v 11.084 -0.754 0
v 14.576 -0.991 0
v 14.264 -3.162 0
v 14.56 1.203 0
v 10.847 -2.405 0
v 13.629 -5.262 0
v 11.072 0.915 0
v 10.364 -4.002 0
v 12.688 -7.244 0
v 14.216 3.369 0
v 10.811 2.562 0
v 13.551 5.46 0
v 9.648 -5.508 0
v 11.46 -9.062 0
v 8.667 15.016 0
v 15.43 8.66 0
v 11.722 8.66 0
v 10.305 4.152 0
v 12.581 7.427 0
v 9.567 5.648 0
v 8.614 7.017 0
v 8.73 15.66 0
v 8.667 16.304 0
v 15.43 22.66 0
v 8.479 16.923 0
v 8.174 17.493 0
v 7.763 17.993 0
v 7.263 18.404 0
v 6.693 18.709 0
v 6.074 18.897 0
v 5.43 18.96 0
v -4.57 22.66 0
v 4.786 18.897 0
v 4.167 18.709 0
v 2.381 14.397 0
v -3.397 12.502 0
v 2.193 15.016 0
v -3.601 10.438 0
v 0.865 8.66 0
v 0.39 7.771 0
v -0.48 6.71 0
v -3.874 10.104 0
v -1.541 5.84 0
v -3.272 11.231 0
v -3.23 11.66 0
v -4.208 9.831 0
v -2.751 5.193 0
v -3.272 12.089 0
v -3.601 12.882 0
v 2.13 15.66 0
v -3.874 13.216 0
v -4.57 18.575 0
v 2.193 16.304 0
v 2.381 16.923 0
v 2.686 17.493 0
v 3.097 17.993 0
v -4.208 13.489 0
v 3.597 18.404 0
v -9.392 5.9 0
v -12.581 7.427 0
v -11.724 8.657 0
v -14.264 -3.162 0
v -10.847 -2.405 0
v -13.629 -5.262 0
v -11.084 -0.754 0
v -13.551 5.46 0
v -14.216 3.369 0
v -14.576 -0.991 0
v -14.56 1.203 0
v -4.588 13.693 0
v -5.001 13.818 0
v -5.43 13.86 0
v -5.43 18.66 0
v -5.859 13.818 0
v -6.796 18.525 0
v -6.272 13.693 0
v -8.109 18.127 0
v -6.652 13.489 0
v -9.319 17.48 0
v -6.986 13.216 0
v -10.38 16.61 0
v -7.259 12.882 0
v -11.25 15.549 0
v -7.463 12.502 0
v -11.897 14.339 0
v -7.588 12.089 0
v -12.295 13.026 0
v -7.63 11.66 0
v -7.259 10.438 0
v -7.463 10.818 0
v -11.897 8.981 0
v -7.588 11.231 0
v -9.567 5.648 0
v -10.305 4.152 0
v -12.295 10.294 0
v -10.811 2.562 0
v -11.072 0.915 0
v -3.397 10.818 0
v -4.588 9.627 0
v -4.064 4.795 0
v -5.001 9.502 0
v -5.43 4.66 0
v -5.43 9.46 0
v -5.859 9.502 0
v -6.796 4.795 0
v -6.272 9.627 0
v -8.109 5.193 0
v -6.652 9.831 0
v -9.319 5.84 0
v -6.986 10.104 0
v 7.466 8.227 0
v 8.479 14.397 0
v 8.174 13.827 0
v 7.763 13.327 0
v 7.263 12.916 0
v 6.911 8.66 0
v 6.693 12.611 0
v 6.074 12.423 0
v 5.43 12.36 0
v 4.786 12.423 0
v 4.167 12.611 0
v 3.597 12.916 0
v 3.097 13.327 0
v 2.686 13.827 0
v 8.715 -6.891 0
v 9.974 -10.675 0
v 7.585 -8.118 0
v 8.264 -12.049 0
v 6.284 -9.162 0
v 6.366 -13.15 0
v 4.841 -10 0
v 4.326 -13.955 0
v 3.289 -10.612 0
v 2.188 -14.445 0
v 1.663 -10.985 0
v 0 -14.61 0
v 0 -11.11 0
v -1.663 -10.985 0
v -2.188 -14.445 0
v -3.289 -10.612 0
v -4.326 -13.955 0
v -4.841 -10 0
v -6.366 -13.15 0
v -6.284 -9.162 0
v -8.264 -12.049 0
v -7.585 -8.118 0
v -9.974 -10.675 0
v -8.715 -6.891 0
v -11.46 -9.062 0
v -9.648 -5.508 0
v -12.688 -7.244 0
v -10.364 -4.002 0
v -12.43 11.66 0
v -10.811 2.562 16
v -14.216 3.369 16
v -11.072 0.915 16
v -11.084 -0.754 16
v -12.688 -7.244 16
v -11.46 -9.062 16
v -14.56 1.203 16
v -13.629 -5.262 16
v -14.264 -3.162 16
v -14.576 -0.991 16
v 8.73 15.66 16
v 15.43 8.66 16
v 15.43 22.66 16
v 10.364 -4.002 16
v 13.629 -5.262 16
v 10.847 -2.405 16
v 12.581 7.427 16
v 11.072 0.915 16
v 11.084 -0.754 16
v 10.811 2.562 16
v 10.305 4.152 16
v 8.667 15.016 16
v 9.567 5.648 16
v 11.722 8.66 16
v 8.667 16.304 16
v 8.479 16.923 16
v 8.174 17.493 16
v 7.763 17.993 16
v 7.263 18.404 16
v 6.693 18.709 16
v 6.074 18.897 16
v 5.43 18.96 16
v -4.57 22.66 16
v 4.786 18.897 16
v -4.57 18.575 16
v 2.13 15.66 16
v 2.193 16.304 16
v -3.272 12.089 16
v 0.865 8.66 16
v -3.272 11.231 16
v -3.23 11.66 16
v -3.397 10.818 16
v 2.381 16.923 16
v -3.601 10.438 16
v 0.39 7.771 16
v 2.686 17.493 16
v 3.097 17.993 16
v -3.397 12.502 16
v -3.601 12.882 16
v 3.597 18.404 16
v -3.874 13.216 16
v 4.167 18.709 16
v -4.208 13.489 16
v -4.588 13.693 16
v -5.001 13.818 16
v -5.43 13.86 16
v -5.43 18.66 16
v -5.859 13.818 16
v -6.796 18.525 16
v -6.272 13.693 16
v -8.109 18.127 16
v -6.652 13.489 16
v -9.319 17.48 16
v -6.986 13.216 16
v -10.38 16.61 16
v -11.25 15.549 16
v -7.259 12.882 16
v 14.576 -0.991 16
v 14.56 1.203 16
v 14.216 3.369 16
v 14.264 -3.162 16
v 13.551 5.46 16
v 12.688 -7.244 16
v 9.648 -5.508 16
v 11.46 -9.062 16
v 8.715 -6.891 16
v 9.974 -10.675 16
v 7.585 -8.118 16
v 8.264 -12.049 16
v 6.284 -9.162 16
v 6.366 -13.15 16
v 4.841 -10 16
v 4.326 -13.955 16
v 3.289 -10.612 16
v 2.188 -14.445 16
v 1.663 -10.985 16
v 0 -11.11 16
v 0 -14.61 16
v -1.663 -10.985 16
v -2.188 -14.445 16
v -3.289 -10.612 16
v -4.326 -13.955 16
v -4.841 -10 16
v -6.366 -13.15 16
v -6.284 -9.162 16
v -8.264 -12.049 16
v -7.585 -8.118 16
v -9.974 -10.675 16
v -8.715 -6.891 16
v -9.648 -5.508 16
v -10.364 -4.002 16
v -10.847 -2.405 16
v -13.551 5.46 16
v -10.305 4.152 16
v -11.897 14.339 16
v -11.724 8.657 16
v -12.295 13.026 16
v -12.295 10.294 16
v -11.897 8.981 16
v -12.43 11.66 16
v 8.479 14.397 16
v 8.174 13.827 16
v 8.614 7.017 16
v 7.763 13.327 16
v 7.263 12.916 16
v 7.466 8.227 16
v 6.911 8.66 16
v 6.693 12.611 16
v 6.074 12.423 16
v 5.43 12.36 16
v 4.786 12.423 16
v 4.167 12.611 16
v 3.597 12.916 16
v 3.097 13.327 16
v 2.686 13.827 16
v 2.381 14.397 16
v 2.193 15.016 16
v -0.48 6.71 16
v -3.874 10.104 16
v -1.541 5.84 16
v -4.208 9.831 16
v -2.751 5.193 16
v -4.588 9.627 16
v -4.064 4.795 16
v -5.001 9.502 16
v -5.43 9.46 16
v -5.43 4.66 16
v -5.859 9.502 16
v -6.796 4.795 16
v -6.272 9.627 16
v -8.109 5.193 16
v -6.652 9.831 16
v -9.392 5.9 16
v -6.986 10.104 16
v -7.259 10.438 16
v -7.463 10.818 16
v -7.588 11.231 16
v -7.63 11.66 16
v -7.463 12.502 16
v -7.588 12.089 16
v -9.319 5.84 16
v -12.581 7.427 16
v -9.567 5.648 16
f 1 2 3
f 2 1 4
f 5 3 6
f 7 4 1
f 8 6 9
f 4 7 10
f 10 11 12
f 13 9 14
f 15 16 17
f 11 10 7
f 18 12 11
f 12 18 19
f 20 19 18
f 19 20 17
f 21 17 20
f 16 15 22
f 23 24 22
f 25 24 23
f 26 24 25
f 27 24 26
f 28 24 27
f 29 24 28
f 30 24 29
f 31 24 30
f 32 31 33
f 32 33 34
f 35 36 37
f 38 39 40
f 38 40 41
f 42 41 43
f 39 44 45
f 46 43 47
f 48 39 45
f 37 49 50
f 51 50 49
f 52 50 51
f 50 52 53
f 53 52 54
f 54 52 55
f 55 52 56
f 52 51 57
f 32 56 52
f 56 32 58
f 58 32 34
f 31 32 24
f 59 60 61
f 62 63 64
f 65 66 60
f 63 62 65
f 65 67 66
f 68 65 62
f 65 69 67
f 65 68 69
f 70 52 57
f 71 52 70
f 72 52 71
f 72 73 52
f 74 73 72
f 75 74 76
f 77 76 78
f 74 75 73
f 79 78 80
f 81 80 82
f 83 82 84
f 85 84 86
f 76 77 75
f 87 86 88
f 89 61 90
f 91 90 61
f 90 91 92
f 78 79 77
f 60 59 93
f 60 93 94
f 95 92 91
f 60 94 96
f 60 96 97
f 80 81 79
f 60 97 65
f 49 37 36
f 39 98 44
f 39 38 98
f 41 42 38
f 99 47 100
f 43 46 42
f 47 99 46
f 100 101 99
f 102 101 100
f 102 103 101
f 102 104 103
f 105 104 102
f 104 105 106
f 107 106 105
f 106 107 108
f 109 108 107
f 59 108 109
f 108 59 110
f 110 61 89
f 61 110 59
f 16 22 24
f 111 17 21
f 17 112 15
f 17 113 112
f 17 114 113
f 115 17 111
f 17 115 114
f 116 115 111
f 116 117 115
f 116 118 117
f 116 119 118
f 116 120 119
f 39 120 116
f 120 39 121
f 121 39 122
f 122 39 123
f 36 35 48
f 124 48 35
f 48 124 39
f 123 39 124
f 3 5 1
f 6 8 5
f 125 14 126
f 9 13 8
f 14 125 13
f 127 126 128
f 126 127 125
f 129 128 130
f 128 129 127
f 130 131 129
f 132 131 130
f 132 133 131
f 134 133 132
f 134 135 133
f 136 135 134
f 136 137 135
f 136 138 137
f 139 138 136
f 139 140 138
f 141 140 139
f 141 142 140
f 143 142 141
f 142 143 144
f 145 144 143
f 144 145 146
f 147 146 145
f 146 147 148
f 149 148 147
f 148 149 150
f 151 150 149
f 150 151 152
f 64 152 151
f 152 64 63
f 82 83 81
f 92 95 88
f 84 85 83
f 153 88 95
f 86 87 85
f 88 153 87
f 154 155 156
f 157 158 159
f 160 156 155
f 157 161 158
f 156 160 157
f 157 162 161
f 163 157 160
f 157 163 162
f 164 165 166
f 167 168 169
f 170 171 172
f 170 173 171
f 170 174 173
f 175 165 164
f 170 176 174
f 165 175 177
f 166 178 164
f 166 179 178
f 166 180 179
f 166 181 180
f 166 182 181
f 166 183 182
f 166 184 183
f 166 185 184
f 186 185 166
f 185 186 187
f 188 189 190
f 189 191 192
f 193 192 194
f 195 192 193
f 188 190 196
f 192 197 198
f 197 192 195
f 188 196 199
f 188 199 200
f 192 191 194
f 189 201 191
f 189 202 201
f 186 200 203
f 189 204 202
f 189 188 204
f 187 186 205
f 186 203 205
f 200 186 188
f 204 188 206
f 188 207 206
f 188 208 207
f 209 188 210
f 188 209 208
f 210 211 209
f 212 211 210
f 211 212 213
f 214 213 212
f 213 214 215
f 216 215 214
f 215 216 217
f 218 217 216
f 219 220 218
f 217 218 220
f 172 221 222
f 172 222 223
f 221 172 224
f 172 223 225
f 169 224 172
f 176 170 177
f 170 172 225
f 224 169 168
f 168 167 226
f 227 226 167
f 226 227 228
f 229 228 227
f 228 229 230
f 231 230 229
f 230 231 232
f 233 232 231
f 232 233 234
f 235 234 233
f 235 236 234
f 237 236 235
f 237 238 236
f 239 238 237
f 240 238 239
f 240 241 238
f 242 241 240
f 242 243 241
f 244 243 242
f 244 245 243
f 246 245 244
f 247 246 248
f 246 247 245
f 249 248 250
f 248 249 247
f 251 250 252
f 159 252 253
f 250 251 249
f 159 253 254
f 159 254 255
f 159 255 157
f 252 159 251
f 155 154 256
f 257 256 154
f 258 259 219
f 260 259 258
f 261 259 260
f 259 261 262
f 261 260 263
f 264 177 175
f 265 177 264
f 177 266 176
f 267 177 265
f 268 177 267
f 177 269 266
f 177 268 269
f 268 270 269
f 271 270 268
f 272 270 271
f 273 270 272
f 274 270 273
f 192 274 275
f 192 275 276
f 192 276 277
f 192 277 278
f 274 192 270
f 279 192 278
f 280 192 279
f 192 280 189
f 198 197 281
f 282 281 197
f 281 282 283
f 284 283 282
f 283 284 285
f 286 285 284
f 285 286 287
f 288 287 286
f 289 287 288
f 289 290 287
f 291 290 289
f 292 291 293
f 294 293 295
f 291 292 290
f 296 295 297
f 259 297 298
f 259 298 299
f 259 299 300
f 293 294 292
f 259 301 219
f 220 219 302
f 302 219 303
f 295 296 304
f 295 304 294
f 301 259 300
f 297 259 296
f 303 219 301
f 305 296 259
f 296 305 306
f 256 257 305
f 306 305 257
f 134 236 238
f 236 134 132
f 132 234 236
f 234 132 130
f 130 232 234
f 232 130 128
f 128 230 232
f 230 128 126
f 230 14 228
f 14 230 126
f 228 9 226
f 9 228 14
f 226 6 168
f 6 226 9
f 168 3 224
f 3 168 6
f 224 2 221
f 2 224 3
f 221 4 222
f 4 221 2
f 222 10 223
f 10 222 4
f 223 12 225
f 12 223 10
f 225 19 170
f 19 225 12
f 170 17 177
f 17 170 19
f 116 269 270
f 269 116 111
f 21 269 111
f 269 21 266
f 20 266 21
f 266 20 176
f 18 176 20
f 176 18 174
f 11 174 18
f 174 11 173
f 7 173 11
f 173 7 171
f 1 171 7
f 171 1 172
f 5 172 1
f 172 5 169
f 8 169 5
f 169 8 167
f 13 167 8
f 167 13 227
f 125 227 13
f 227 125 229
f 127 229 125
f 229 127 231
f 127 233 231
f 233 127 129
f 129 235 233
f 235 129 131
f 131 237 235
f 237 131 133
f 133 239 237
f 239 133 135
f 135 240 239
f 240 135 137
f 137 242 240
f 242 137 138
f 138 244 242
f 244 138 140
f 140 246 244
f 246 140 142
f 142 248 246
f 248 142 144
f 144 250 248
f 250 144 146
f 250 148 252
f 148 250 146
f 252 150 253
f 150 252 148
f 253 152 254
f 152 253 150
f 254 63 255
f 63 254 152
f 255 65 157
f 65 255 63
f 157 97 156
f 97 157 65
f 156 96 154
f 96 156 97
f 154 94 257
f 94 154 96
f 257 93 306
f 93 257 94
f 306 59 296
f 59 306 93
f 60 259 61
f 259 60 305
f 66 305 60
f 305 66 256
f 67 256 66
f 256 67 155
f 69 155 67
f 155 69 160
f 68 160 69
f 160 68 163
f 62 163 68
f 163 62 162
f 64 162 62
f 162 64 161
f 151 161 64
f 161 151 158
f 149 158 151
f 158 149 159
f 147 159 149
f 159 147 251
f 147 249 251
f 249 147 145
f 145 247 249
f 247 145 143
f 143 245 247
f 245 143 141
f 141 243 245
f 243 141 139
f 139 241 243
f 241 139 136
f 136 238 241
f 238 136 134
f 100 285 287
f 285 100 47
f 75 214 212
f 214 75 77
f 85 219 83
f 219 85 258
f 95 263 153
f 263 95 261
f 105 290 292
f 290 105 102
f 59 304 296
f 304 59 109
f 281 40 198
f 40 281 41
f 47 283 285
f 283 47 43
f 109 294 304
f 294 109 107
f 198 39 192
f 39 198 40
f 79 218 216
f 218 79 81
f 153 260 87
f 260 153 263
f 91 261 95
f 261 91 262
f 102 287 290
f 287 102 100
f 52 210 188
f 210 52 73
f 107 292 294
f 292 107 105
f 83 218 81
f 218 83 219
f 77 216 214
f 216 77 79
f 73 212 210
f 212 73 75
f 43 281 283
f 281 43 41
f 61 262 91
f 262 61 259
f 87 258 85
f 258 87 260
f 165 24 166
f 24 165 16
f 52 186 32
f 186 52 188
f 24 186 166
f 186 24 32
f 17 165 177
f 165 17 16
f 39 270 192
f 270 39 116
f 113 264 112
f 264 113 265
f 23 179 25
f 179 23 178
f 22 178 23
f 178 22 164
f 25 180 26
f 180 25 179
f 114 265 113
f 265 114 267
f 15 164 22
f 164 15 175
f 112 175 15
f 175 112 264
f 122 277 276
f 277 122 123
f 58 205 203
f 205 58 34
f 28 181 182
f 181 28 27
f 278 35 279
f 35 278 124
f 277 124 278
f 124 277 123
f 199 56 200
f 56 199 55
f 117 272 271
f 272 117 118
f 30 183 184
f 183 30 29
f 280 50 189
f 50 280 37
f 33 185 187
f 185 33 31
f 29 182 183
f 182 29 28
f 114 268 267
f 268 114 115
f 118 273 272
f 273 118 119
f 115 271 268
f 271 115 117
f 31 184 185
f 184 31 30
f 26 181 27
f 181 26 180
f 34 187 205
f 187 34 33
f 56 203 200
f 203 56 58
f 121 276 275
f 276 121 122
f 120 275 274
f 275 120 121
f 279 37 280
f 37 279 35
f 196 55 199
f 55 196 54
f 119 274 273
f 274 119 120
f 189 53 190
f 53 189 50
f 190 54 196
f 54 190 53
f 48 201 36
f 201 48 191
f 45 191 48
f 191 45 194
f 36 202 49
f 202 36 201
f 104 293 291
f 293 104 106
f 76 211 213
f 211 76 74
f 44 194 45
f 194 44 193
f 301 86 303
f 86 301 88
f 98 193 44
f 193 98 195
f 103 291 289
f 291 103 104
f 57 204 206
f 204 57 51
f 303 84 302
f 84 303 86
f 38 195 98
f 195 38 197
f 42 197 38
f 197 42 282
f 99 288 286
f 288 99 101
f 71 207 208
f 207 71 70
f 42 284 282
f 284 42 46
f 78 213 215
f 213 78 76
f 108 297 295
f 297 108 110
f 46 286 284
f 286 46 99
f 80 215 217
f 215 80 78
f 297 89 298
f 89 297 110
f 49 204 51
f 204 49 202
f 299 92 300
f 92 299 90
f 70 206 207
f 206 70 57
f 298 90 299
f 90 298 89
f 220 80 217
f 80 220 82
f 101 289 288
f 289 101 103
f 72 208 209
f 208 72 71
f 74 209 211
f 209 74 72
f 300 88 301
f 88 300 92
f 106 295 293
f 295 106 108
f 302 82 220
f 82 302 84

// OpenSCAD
$fn = 32;

// ----------------------------------------------------------------------
// Pipe clamp: 29.22 mm ring, 3.5 mm wall, 16 mm wide
// ----------------------------------------------------------------------

// --- parameters (mm) ---
outer_r = 14.61;          // clamp outside radius
inner_r = 11.11;          // pipe bore radius
band = 3.5;               // band thickness
clamp_w = 16;             // clamp width
opening = 50;             // opening angle between the ends
lug_w = 20;               // lug width
lug_len = 14;             // lug length
bolt_d = 6.6;             // bolt hole
knuckle_d = 14;           // hinge knuckle diameter
pin_d = 4.4;              // hinge pin hole

clamp_profile = [[-6.174, 13.241], [-8.087, 12.167], [-9.818, 10.819], [-11.327, 9.227], [-12.581, 7.427], [-13.551, 5.46], [-14.216, 3.369], [-14.56, 1.203], [-14.576, -0.991], [-14.264, -3.162], [-13.629, -5.262], [-12.688, -7.244], [-11.46, -9.062], [-9.974, -10.675], [-8.264, -12.049], [-6.366, -13.15], [-4.326, -13.955], [-2.188, -14.445], [0, -14.61], [2.188, -14.445], [4.326, -13.955], [6.366, -13.15], [8.264, -12.049], [9.974, -10.675], [11.46, -9.062], [12.688, -7.244], [13.629, -5.262], [14.264, -3.162], [14.576, -0.991], [14.56, 1.203], [14.216, 3.369], [13.551, 5.46], [12.581, 7.427], [11.327, 9.227], [9.818, 10.819], [8.087, 12.167], [6.174, 13.241], [4.695, 10.069], [6.15, 9.253], [7.466, 8.227], [8.614, 7.017], [9.567, 5.648], [10.305, 4.152], [10.811, 2.562], [11.072, 0.915], [11.084, -0.754], [10.847, -2.405], [10.364, -4.002], [9.648, -5.508], [8.715, -6.891], [7.585, -8.118], [6.284, -9.162], [4.841, -10], [3.289, -10.612], [1.663, -10.985], [0, -11.11], [-1.663, -10.985], [-3.289, -10.612], [-4.841, -10], [-6.284, -9.162], [-7.585, -8.118], [-8.715, -6.891], [-9.648, -5.508], [-10.364, -4.002], [-10.847, -2.405], [-11.084, -0.754], [-11.072, 0.915], [-10.811, 2.562], [-10.305, 4.152], [-9.567, 5.648], [-8.614, 7.017], [-7.466, 8.227], [-6.15, 9.253], [-4.695, 10.069]];

difference() {
  union() {
    linear_extrude(height = clamp_w) polygon(clamp_profile);
    /* hinge knuckle, sunk 2 mm into the band end */
    translate([-5.43, 11.66, 0]) cylinder(h = clamp_w, d = knuckle_d);
    /* bolt lug on the other end */
    translate([-4.57, 8.66, 0]) cube([lug_w, 14, clamp_w]);
  }
  translate([5.43, 15.66, -2.5]) cylinder(h = clamp_w + 5, d = bolt_d);
  translate([-5.43, 11.66, -2.5]) cylinder(h = clamp_w + 5, d = pin_d);
}
